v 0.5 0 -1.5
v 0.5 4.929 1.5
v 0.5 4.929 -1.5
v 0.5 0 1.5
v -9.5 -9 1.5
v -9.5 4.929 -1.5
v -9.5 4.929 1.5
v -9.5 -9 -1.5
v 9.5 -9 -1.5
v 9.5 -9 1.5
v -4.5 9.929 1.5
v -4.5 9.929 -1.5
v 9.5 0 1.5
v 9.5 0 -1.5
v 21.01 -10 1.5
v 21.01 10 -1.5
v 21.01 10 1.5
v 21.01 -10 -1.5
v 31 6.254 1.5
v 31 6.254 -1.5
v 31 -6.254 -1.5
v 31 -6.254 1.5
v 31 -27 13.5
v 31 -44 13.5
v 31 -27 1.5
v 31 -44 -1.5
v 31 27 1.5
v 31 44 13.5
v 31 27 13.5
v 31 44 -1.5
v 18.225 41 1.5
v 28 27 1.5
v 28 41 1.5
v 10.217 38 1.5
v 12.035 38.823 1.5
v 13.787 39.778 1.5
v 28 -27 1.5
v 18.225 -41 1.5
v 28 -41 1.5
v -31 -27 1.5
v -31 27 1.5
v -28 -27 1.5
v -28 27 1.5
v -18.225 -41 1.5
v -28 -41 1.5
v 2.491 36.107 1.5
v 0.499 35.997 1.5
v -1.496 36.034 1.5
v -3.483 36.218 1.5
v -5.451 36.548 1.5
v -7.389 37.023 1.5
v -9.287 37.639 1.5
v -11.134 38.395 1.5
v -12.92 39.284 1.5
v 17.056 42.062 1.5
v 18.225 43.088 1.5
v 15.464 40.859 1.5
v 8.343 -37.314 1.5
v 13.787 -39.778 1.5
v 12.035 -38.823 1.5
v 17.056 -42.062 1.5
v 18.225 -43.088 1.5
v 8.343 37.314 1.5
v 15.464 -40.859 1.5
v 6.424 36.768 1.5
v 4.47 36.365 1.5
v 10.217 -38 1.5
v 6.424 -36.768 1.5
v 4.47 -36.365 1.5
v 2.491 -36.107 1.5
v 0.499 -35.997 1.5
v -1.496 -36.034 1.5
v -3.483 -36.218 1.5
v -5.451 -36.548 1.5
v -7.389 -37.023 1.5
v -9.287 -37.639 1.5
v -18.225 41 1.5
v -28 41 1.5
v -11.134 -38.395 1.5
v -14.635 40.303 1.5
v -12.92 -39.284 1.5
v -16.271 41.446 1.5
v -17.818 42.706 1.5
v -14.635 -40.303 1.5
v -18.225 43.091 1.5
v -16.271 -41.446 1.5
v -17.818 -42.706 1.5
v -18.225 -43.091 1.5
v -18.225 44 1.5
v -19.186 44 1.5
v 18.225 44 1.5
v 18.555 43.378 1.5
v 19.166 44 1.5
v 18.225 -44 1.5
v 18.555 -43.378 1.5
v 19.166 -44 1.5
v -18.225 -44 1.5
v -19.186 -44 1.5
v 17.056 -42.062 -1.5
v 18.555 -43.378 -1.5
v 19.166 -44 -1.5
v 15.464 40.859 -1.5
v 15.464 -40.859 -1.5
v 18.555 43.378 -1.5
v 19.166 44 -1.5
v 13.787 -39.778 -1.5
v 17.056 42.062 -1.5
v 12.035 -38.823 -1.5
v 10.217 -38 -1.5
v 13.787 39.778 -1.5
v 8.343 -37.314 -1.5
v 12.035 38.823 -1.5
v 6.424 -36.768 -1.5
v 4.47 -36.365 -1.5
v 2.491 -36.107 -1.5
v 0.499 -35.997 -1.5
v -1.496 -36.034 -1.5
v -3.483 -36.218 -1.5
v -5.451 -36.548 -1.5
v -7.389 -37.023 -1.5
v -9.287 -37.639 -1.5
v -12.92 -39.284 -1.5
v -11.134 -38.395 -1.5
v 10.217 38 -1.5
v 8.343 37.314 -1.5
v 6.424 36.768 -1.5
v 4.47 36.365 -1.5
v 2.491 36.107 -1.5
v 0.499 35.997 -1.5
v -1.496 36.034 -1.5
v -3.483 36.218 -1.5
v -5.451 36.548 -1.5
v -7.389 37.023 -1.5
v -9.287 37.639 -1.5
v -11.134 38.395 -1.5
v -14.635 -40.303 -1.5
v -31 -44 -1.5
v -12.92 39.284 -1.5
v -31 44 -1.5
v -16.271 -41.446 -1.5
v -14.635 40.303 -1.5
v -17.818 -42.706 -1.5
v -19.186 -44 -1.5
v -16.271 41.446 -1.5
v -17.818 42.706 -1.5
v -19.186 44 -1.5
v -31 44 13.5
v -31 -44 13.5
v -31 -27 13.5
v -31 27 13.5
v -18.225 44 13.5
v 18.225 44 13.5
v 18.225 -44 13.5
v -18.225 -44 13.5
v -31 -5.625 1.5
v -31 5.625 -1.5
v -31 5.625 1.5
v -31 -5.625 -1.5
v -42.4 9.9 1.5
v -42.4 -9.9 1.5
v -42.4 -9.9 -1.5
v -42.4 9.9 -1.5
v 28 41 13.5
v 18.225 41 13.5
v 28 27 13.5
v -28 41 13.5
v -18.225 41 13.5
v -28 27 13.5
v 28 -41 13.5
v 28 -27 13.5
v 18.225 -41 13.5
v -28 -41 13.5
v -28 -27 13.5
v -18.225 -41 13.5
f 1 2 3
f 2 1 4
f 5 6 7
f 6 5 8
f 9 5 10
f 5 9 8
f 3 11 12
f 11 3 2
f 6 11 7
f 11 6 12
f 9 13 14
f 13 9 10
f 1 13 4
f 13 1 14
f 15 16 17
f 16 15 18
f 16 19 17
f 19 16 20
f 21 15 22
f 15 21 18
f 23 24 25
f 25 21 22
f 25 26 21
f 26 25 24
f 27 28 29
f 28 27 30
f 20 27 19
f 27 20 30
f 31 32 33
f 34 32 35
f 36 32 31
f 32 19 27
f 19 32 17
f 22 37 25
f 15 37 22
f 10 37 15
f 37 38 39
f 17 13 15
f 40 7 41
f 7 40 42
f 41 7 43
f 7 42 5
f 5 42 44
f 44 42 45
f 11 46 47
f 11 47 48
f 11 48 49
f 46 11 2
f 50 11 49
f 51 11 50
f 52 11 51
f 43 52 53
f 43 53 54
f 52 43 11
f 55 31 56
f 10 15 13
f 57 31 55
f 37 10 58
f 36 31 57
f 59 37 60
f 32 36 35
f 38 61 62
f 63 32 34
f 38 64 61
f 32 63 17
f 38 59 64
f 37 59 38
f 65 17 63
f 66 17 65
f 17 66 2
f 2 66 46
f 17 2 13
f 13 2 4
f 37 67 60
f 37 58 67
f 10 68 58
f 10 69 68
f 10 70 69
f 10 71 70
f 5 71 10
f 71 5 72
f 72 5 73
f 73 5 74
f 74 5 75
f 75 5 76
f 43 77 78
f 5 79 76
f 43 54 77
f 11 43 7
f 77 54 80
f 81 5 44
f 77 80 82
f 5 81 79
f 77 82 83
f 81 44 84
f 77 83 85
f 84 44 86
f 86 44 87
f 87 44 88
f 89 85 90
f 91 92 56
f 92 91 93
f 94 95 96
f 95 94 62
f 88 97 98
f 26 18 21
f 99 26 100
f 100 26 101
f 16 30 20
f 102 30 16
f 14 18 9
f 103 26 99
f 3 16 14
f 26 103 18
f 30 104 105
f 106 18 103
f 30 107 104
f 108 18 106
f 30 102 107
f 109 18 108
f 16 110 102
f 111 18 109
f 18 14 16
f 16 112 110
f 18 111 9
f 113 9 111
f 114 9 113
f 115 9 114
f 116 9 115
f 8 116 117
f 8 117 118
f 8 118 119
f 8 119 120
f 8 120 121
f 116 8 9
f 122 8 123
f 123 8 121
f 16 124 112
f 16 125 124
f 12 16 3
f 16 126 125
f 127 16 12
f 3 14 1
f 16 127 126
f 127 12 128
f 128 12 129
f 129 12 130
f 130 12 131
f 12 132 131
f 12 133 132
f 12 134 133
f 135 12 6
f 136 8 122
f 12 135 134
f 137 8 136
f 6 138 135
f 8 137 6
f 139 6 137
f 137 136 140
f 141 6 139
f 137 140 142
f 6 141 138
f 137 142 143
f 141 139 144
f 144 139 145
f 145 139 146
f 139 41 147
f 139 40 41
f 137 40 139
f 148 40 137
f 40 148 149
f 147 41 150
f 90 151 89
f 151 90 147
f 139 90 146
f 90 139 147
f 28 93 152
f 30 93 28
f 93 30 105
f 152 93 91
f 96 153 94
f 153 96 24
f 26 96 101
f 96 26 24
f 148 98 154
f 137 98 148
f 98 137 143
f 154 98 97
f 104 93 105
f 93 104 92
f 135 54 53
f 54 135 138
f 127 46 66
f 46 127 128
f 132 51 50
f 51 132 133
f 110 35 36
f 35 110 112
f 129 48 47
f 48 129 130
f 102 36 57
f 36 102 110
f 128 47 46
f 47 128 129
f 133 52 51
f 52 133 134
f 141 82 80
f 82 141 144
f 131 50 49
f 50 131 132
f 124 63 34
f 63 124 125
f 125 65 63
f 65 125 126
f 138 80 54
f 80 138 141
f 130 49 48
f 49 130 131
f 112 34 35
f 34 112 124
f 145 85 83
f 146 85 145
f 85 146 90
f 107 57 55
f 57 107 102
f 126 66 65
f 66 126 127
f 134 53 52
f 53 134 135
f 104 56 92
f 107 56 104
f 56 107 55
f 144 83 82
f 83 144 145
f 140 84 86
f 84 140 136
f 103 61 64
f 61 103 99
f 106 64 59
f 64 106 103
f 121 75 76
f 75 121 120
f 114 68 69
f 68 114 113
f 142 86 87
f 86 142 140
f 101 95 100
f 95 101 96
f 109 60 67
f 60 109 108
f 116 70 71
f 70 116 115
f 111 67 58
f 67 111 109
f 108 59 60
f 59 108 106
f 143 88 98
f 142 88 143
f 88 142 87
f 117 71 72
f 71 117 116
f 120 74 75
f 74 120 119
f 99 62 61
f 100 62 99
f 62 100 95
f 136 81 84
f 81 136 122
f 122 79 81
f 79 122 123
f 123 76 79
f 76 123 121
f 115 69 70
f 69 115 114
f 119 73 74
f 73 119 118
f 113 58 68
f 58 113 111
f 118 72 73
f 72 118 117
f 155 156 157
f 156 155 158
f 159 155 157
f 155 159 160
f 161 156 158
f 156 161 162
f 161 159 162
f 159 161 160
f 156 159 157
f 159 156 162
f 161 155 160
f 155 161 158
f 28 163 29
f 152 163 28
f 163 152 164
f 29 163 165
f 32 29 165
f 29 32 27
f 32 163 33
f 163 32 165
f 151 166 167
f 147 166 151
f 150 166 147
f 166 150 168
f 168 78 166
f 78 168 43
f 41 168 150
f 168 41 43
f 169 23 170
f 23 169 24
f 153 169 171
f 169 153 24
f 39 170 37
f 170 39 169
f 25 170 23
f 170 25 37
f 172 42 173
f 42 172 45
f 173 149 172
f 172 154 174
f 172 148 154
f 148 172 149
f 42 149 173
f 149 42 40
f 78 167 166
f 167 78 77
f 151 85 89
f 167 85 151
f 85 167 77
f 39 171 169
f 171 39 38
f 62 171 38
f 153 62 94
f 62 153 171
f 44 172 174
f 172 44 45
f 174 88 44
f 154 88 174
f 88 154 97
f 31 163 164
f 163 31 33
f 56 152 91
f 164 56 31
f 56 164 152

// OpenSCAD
// [FL_INDEX: keywords="openscad, 3d_parametric, Customizable_Game_Card_Holder, csg_solid" | COT="Parametric OpenSCAD design from 3DCodeverse"]
// Title: Customizable Game Card Holder

//Settlers game card holder
// 1 to 1 copy of previous blender version but with parameters for changeing dimention

//Constants
// Card short side in mm (Default settlers card 54mm)
card_x = 54;

// Card long side in mm (Default settlers card 80mm)
card_y = 80;

show_logo = "yes"; // [yes,no]

connectors = "yes";  // [yes,no]

// Gap between card and the walls of the holder
card_space = 2; //original 2
wall_thickness = 3; //original 2
plate_height = 3; //original 2
wall_height = 12; //original 12
shortwall_cut = card_x/(card_y/card_x);
shortwall = (card_x-shortwall_cut)/2+wall_thickness+card_space/2;

//Connecting piece
//the "female" part is 21mm at the biggest point and 12.5mm at the smallest and 10mm deep
//the "male" part is  19.8mm at the biggest point and 10.46mm at smallest and 11.4mm long
//the odd numbers are because i used a manualy freehand modifed box with no real grid snapping, and some random scaling
// ignore variable values
female_con_x = 10+1-1;
female_con_y1 = 21+1-2;
female_con_y2 = 12.5+1-1;
male_con_x = 11.4+1-1;
male_con_y1 = 19.8+1-1;
male_con_y2 = 10.46+1-1;
angle = atan( ((female_con_y1-female_con_y2)/2) / female_con_x ); // same for both


	

union() {

	difference() {
		//Base plate
		cube(size = [card_x+card_space+wall_thickness*2, card_y+card_space+wall_thickness*2,plate_height], center = true);
		//Round Cut
		// was made with a cylinder with radius=32 scaled in x and y by 0.8, resulting in R=25.6 and that is aprox card_x
		translate([0,card_y/1.27,-card_x/4])
		cylinder(card_x/2, card_x/2, card_x/2, $fa=2);
		translate([0,-card_y/1.27,-card_x/4])
		cylinder(card_x/2, card_x/2, card_x/2, $fa=2);
		
		//Logo
		if (show_logo == "yes") {
			union() {
				translate([0, -4.5, 0])
				cube(size = [19,9,10], center = true);
				difference() {
					translate([-4.5, 0.5 ,0])
					cube(size = [10,19,10], center = true);
					translate([0.5, 12 ,0])
					rotate([0, 0, 45])
					cube(size = [10,12,11], center = true);
					translate([-9.5, 12 ,0])
					rotate([0, 0, 45])
					cube(size = [12,10,11], center = true);
				}
			}
		}
		
		//female con
		if (connectors == "yes") {
			translate( [ (card_x/2) - female_con_x + card_space/2 + wall_thickness +0.01 , -female_con_y1/2, -plate_height ] ) //0.01 is for overlapping
			difference() {
				cube(size = [female_con_x, female_con_y1, plate_height*2], center = false);
				translate( [ 0,female_con_y1,-1 ] )
				rotate([0, 0, -angle])
				cube(female_con_x*2);
				translate( [ 0,0,-1 ] )
				rotate([0, 0, angle-90])
				cube(female_con_x*2);
			}
		}
	}

	//male con
	if (connectors == "yes") {
		translate( [ -(card_x/2) - card_space/2 - wall_thickness - male_con_x, -male_con_y1/2, -plate_height/2 ] ) 
		difference() {
			cube(size = [male_con_x, male_con_y1, plate_height], center = false);
			translate( [ 0,male_con_y1,-1 ] )
			rotate([0, 0, -angle])
			cube(male_con_x*2);
			translate( [ 0,0,-1 ] )
			rotate([0, 0, angle-90])
			cube(male_con_x*2);
		}
	}

	//Cards for reference
	//%cube(size = [card_x,card_y,9], center = true);
	//%cube(size = [card_y,card_x,9], center = true);
	
	//%cube(size= [shortwall_cut, 100,20], center = true);
	
	// Long wall 1 of 4
	translate([  (card_x+card_space+wall_thickness*2)/2 , (card_y+card_space+wall_thickness*2)/2 ,plate_height/2])
	rotate([0,0,180])
	cube(size = [wall_thickness,(card_y-card_x)/2+wall_thickness+card_space/2,wall_height] ,center = false);
	
	// Long wall 2 of 4
	translate([  -(card_x+card_space+wall_thickness*2)/2 +wall_thickness , (card_y+card_space+wall_thickness*2)/2 ,plate_height/2])
	rotate([0,0,180])
	cube(size = [wall_thickness,(card_y-card_x)/2+wall_thickness+card_space/2,wall_height] ,center = false);
	
	// Long wall 3 of 4
	translate([  (card_x+card_space+wall_thickness*2)/2 -wall_thickness, -(card_y+card_space+wall_thickness*2)/2 ,plate_height/2])
	rotate([0,0,0])
	cube(size = [wall_thickness,(card_y-card_x)/2+wall_thickness+card_space/2,wall_height] ,center = false);
	
	// Long wall 4 of 4
	translate([  -(card_x+card_space+wall_thickness*2)/2 , -(card_y+card_space+wall_thickness*2)/2 ,plate_height/2])
	rotate([0,0,0])
	cube(size = [wall_thickness,(card_y-card_x)/2+wall_thickness+card_space/2,wall_height] ,center = false);
	
	//Shortwall 1 of 4
	//the cut to make the space between the walls was originaly 37mm
	translate([  -(card_x+card_space+wall_thickness*2)/2  , (card_y+card_space+wall_thickness*2)/2 ,plate_height/2])
	rotate([0,0,270])
	cube(size = [wall_thickness, shortwall , wall_height] ,center = false);
	
	//Shortwall 2 of 4
	//the cut to make the space between the walls was originaly 37mm
	translate([  (card_x+card_space+wall_thickness*2)/2 , -(card_y+card_space+wall_thickness*2)/2 ,plate_height/2])
	rotate([0,0,90])
	cube(size = [wall_thickness, shortwall , wall_height] ,center = false);
	
	//Shortwall 3 of 4
	//the cut to make the space between the walls was originaly 37mm
	translate([  -(card_x+card_space+wall_thickness*2)/2 , -(card_y+card_space+wall_thickness*2)/2 +wall_thickness ,plate_height/2])
	rotate([0,0,270])
	cube(size = [wall_thickness, shortwall , wall_height] ,center = false);
	
	//Shortwall 4 of 4
	//the cut to make the space between the walls was originaly 37mm
	translate([  (card_x+card_space+wall_thickness*2)/2 , (card_y+card_space+wall_thickness*2)/2 -wall_thickness ,plate_height/2])
	rotate([0,0,90])
	cube(size = [wall_thickness, shortwall , wall_height] ,center = false);
	

}
